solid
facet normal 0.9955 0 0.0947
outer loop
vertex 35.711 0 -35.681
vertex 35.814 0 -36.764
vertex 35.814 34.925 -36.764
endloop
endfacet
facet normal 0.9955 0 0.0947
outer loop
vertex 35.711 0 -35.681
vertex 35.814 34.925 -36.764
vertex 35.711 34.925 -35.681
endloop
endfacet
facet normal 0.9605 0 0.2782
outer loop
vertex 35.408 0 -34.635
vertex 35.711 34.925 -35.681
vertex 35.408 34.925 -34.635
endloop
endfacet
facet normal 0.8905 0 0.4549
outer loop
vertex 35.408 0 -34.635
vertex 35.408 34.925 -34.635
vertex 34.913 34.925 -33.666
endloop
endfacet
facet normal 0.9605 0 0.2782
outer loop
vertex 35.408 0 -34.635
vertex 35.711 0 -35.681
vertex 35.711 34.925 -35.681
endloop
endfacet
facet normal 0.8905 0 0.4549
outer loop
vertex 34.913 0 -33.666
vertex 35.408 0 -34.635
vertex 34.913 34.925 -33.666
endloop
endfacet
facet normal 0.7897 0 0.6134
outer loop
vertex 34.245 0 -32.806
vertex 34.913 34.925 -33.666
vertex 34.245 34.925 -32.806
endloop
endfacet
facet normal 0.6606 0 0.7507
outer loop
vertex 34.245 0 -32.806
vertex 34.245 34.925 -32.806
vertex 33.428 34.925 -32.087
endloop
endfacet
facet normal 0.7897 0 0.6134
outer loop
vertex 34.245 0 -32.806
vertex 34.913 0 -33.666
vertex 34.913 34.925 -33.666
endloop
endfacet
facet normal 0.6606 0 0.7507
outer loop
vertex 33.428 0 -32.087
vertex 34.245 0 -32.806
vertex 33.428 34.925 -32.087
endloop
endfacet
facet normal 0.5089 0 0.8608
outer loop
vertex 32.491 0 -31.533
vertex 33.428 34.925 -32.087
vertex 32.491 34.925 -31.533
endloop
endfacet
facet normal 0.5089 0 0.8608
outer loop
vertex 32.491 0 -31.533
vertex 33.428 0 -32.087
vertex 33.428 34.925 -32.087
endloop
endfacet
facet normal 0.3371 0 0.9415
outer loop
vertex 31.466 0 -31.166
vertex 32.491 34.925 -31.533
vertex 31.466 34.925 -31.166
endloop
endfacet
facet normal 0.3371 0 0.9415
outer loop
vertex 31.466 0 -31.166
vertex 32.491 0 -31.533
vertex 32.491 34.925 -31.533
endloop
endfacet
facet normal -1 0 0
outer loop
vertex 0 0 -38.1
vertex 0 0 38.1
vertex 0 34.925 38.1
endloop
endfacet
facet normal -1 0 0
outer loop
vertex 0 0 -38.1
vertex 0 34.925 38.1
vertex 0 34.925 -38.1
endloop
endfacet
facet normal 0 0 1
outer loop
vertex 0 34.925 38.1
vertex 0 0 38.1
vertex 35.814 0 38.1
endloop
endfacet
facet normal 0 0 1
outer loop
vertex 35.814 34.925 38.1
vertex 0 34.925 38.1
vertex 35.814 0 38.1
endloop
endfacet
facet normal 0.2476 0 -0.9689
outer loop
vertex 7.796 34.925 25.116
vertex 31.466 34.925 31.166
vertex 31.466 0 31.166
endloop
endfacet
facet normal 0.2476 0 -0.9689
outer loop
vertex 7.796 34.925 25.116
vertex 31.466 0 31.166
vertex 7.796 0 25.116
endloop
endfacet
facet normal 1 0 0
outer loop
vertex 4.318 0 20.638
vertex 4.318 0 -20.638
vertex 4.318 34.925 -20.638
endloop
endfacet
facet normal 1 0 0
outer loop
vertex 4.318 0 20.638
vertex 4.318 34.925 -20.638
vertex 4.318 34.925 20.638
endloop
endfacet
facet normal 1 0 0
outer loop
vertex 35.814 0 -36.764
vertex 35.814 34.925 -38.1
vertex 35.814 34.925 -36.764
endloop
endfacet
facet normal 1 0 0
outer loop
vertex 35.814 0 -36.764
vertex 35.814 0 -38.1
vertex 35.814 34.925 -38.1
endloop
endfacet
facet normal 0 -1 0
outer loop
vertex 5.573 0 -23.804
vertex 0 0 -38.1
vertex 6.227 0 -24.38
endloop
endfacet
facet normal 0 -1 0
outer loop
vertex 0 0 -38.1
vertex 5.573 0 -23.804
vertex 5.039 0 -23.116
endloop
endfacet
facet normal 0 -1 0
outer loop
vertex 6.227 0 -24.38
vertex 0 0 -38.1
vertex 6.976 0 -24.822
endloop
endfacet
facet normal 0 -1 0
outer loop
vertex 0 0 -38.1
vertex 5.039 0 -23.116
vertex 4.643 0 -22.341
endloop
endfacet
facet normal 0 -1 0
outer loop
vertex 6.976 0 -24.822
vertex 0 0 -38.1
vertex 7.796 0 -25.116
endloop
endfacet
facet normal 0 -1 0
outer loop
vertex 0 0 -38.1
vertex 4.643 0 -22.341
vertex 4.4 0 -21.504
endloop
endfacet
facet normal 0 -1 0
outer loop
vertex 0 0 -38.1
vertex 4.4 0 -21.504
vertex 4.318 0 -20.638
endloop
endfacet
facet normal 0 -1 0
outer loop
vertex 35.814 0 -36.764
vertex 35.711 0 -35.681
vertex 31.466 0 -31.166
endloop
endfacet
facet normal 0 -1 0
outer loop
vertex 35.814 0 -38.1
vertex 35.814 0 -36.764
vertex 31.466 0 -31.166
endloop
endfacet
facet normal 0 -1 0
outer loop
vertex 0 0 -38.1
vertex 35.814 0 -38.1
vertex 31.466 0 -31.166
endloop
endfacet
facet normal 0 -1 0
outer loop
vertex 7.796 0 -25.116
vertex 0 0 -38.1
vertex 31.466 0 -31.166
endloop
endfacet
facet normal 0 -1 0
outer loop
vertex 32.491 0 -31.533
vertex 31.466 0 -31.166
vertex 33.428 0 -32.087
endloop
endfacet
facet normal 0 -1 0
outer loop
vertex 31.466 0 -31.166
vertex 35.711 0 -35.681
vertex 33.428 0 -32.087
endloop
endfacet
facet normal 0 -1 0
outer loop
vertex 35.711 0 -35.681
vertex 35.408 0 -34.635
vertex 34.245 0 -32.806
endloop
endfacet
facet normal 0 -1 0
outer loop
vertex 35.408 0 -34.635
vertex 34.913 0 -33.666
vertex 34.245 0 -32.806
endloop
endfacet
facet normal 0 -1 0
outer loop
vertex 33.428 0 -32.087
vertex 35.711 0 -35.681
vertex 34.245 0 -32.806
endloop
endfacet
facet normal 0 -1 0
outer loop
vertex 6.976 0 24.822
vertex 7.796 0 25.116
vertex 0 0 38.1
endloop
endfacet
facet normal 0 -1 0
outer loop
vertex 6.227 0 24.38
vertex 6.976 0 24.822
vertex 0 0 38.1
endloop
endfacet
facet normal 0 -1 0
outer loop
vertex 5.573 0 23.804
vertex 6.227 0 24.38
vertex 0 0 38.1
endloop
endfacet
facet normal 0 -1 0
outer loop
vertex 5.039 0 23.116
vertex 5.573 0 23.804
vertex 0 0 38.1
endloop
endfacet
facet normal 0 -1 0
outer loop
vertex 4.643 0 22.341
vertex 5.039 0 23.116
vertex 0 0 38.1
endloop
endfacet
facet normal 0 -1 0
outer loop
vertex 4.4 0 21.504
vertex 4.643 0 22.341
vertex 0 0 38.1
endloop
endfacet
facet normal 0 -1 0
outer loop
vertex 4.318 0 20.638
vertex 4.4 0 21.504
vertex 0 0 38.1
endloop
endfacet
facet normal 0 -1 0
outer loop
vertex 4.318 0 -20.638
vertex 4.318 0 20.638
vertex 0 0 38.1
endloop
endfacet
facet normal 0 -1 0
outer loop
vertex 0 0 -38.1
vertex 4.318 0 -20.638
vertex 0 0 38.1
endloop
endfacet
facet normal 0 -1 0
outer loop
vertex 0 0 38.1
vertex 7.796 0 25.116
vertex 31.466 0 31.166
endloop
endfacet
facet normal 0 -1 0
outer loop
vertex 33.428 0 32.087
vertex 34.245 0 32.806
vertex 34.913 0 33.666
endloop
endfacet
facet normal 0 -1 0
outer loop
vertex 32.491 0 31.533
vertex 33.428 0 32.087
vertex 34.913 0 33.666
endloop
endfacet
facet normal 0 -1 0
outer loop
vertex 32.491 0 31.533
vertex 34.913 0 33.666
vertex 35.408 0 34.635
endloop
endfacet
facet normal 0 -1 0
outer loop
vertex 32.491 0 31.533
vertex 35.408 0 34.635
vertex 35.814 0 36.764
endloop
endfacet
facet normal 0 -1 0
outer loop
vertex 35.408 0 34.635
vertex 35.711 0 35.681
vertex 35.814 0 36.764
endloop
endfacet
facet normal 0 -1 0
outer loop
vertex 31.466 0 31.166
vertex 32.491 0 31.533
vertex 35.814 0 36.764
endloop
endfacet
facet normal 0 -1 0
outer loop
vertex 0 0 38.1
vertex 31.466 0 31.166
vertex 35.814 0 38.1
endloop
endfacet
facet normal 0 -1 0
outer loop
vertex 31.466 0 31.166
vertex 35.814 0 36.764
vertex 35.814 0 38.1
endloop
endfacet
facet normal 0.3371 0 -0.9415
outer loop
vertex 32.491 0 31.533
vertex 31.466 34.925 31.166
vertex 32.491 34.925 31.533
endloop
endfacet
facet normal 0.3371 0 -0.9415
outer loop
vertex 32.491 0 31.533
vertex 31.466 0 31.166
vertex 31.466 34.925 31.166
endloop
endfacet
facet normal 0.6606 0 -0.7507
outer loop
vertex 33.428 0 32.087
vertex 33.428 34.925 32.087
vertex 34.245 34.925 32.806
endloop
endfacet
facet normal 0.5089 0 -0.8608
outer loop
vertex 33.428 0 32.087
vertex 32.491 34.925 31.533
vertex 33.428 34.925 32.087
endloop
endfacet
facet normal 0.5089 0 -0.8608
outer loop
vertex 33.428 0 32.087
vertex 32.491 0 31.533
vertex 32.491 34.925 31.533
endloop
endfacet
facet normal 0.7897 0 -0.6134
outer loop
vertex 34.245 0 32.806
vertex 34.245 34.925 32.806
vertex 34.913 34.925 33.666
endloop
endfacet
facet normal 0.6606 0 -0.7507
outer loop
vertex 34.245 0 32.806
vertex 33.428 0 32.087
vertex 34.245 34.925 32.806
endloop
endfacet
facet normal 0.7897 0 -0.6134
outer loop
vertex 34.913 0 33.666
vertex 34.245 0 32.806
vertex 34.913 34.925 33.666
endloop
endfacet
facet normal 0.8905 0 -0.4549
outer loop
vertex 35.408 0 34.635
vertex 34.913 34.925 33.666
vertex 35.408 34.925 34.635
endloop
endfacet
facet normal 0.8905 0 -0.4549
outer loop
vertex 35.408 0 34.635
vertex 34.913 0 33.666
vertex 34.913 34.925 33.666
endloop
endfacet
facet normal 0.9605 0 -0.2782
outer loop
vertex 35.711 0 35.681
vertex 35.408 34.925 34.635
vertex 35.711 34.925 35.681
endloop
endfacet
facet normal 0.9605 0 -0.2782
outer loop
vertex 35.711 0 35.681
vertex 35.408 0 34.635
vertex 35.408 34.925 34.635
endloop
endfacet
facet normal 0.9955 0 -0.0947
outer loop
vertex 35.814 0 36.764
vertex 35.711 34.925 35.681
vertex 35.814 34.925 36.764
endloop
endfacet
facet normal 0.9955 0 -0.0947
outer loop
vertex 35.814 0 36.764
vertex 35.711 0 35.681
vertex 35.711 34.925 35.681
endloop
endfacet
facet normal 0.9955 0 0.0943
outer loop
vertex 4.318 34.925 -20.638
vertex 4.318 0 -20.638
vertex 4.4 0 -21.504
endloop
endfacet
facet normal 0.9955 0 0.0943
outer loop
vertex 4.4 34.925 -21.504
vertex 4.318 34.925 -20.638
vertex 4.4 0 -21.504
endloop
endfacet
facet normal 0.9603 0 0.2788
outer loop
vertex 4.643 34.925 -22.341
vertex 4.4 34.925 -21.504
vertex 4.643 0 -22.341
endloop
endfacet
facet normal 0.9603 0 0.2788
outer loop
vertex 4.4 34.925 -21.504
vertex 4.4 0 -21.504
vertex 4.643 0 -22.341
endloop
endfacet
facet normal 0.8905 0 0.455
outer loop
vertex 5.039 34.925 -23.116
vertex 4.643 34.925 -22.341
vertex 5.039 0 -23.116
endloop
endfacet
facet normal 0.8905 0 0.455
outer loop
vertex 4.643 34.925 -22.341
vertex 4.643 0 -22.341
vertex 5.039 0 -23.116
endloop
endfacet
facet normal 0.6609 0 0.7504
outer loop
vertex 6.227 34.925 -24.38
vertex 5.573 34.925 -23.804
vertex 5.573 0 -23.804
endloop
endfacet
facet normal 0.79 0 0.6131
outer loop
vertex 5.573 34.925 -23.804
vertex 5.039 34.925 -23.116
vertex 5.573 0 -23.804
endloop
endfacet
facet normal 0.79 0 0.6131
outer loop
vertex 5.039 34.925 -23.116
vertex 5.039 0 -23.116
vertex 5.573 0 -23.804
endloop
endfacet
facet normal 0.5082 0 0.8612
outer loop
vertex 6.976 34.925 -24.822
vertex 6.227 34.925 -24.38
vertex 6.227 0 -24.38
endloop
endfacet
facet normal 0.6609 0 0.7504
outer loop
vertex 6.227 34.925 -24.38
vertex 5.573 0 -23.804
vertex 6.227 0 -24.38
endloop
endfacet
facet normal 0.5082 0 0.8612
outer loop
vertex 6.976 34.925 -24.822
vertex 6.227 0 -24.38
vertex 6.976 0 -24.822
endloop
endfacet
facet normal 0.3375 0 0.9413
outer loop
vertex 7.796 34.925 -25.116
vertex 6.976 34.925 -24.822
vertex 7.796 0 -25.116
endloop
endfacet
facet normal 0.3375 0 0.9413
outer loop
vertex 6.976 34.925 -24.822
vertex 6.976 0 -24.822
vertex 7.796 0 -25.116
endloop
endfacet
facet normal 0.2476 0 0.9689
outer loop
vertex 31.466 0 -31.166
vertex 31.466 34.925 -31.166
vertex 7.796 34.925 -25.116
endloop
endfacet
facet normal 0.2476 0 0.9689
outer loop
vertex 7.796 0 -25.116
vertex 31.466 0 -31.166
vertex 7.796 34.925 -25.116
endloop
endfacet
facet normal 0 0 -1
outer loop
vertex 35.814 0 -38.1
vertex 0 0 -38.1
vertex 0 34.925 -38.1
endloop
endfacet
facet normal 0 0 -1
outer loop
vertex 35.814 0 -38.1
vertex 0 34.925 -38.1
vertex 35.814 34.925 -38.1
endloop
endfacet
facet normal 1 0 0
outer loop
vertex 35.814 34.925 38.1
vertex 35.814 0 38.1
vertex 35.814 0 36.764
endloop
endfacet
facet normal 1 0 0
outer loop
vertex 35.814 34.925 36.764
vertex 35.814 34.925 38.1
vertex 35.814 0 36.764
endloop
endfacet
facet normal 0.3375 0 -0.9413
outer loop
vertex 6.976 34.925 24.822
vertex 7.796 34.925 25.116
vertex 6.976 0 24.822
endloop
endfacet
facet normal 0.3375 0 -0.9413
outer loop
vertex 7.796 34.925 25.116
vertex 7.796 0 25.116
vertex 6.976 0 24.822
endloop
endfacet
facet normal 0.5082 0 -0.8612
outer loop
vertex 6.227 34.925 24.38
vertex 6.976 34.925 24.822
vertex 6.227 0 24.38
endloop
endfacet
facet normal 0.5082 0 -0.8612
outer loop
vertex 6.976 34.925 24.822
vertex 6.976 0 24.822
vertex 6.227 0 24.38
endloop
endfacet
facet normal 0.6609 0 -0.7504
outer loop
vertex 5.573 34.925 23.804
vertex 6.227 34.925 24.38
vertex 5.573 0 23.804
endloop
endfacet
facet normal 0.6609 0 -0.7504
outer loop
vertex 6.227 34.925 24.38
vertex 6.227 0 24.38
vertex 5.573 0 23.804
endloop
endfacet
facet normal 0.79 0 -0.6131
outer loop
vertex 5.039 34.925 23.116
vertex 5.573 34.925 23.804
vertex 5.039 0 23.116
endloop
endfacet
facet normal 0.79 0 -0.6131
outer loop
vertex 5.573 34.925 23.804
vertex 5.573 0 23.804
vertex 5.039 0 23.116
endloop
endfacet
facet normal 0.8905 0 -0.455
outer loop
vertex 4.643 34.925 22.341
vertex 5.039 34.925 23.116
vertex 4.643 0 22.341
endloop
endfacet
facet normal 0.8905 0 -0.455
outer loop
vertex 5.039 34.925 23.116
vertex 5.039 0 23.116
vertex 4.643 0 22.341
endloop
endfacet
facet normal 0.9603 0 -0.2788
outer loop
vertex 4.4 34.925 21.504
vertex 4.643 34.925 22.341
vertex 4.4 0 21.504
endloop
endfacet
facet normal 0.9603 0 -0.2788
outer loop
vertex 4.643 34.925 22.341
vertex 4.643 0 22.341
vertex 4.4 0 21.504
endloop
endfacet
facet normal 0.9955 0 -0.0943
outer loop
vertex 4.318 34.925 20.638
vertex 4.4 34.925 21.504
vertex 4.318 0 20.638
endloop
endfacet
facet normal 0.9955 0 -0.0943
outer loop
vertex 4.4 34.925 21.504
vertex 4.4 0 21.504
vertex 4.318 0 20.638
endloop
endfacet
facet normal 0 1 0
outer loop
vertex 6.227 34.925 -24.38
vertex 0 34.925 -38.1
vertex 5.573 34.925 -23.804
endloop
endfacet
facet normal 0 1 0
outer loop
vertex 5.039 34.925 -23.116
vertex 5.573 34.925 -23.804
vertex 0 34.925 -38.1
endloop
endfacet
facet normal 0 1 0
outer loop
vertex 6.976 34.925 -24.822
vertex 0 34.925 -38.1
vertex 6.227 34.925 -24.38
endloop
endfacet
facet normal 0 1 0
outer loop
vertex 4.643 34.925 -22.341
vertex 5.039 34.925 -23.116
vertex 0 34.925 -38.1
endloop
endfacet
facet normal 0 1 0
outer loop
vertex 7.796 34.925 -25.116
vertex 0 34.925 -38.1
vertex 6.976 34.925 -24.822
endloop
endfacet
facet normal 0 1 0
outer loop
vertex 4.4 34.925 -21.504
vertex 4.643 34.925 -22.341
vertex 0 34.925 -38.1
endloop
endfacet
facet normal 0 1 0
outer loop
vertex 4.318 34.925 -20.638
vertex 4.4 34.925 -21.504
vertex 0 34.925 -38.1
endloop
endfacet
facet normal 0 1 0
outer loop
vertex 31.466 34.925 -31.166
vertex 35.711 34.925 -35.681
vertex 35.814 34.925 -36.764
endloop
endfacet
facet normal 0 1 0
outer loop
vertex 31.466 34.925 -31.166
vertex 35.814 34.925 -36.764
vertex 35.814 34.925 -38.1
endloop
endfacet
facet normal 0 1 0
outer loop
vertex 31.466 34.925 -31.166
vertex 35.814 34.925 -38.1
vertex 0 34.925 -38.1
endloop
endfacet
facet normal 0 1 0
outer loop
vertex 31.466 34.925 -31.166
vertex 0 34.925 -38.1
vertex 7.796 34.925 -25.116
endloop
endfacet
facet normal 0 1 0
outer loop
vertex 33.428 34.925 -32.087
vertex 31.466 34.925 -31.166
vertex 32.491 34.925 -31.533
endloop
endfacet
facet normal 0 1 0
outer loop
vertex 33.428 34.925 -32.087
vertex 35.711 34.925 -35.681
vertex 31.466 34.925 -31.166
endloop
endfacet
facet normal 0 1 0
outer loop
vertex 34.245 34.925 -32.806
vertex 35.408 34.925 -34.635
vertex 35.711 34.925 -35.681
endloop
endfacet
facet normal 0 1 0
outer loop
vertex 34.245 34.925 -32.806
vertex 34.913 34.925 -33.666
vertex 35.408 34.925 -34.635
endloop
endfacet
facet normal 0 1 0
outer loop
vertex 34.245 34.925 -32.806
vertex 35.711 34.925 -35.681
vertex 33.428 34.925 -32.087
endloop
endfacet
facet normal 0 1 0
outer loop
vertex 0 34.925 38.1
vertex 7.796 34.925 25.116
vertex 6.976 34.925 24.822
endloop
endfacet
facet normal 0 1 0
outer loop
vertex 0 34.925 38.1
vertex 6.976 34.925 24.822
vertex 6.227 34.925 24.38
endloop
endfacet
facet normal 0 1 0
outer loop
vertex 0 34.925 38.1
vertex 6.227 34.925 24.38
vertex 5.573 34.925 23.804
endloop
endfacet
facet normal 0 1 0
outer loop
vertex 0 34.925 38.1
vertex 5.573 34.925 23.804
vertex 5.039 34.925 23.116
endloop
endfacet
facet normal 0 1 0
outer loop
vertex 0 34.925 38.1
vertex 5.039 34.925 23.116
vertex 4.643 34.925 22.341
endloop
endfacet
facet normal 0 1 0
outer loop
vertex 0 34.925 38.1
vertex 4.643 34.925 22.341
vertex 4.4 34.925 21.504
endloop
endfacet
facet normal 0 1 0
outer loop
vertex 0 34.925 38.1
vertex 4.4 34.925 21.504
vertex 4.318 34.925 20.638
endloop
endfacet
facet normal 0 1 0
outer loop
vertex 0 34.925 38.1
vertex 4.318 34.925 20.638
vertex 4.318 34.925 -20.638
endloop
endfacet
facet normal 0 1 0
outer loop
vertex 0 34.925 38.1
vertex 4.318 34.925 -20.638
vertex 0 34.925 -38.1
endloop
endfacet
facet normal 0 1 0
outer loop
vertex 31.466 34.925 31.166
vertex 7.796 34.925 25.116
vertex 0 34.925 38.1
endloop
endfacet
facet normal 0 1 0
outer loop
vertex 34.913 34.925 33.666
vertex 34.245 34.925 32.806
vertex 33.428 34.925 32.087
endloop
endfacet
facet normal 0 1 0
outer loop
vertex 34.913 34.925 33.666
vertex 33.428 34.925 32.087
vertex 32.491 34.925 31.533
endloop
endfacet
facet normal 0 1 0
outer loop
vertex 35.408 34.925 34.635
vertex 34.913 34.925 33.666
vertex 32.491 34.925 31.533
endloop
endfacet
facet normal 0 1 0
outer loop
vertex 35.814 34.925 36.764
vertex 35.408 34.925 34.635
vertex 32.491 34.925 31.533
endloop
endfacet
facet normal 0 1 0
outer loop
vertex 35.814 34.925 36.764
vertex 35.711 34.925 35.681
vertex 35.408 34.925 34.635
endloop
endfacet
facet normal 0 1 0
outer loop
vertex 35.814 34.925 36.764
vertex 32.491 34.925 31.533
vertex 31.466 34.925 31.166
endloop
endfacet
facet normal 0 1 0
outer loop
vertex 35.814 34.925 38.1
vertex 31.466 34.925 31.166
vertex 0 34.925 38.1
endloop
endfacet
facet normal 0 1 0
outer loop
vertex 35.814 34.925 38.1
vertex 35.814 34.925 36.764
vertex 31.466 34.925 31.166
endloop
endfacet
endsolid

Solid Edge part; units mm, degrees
sketch "Sketch1" plane through (0, 0, 0) normal (0, -1, 0) x (1, 0, 0)
  line L0 (0, 38.1) -> (35.814, 38.1)
  line L1 (35.814, 38.1) -> (35.814, 36.7644)
  arc A0 (35.814, 36.7644) -> (31.4663, 31.1658) centre (30.0355, 36.7644) cw
  line L2 (31.4663, 31.1658) -> (7.7961, 25.1163)
  arc A1 (7.7961, 25.1163) -> (4.318, 20.6375) centre (8.9408, 20.6375) ccw
  line L3 (4.318, -20.6375) -> (4.318, 20.6375)
  arc A2 (7.7961, -25.1163) -> (4.318, -20.6375) centre (8.9408, -20.6375) cw
  line L4 (31.4663, -31.1658) -> (7.7961, -25.1163)
  arc A3 (35.814, -36.7644) -> (31.4663, -31.1658) centre (30.0355, -36.7644) ccw
  line L5 (35.814, -38.1) -> (35.814, -36.7644)
  line L6 (0, -38.1) -> (35.814, -38.1)
  line L7 (0, 38.1) -> (0, -38.1)
  dimension "D1" = 76.2
  dimension "D2" = 35.814
extrude "Protrusion1" add sketch "Sketch1" against normal blind 34.925
